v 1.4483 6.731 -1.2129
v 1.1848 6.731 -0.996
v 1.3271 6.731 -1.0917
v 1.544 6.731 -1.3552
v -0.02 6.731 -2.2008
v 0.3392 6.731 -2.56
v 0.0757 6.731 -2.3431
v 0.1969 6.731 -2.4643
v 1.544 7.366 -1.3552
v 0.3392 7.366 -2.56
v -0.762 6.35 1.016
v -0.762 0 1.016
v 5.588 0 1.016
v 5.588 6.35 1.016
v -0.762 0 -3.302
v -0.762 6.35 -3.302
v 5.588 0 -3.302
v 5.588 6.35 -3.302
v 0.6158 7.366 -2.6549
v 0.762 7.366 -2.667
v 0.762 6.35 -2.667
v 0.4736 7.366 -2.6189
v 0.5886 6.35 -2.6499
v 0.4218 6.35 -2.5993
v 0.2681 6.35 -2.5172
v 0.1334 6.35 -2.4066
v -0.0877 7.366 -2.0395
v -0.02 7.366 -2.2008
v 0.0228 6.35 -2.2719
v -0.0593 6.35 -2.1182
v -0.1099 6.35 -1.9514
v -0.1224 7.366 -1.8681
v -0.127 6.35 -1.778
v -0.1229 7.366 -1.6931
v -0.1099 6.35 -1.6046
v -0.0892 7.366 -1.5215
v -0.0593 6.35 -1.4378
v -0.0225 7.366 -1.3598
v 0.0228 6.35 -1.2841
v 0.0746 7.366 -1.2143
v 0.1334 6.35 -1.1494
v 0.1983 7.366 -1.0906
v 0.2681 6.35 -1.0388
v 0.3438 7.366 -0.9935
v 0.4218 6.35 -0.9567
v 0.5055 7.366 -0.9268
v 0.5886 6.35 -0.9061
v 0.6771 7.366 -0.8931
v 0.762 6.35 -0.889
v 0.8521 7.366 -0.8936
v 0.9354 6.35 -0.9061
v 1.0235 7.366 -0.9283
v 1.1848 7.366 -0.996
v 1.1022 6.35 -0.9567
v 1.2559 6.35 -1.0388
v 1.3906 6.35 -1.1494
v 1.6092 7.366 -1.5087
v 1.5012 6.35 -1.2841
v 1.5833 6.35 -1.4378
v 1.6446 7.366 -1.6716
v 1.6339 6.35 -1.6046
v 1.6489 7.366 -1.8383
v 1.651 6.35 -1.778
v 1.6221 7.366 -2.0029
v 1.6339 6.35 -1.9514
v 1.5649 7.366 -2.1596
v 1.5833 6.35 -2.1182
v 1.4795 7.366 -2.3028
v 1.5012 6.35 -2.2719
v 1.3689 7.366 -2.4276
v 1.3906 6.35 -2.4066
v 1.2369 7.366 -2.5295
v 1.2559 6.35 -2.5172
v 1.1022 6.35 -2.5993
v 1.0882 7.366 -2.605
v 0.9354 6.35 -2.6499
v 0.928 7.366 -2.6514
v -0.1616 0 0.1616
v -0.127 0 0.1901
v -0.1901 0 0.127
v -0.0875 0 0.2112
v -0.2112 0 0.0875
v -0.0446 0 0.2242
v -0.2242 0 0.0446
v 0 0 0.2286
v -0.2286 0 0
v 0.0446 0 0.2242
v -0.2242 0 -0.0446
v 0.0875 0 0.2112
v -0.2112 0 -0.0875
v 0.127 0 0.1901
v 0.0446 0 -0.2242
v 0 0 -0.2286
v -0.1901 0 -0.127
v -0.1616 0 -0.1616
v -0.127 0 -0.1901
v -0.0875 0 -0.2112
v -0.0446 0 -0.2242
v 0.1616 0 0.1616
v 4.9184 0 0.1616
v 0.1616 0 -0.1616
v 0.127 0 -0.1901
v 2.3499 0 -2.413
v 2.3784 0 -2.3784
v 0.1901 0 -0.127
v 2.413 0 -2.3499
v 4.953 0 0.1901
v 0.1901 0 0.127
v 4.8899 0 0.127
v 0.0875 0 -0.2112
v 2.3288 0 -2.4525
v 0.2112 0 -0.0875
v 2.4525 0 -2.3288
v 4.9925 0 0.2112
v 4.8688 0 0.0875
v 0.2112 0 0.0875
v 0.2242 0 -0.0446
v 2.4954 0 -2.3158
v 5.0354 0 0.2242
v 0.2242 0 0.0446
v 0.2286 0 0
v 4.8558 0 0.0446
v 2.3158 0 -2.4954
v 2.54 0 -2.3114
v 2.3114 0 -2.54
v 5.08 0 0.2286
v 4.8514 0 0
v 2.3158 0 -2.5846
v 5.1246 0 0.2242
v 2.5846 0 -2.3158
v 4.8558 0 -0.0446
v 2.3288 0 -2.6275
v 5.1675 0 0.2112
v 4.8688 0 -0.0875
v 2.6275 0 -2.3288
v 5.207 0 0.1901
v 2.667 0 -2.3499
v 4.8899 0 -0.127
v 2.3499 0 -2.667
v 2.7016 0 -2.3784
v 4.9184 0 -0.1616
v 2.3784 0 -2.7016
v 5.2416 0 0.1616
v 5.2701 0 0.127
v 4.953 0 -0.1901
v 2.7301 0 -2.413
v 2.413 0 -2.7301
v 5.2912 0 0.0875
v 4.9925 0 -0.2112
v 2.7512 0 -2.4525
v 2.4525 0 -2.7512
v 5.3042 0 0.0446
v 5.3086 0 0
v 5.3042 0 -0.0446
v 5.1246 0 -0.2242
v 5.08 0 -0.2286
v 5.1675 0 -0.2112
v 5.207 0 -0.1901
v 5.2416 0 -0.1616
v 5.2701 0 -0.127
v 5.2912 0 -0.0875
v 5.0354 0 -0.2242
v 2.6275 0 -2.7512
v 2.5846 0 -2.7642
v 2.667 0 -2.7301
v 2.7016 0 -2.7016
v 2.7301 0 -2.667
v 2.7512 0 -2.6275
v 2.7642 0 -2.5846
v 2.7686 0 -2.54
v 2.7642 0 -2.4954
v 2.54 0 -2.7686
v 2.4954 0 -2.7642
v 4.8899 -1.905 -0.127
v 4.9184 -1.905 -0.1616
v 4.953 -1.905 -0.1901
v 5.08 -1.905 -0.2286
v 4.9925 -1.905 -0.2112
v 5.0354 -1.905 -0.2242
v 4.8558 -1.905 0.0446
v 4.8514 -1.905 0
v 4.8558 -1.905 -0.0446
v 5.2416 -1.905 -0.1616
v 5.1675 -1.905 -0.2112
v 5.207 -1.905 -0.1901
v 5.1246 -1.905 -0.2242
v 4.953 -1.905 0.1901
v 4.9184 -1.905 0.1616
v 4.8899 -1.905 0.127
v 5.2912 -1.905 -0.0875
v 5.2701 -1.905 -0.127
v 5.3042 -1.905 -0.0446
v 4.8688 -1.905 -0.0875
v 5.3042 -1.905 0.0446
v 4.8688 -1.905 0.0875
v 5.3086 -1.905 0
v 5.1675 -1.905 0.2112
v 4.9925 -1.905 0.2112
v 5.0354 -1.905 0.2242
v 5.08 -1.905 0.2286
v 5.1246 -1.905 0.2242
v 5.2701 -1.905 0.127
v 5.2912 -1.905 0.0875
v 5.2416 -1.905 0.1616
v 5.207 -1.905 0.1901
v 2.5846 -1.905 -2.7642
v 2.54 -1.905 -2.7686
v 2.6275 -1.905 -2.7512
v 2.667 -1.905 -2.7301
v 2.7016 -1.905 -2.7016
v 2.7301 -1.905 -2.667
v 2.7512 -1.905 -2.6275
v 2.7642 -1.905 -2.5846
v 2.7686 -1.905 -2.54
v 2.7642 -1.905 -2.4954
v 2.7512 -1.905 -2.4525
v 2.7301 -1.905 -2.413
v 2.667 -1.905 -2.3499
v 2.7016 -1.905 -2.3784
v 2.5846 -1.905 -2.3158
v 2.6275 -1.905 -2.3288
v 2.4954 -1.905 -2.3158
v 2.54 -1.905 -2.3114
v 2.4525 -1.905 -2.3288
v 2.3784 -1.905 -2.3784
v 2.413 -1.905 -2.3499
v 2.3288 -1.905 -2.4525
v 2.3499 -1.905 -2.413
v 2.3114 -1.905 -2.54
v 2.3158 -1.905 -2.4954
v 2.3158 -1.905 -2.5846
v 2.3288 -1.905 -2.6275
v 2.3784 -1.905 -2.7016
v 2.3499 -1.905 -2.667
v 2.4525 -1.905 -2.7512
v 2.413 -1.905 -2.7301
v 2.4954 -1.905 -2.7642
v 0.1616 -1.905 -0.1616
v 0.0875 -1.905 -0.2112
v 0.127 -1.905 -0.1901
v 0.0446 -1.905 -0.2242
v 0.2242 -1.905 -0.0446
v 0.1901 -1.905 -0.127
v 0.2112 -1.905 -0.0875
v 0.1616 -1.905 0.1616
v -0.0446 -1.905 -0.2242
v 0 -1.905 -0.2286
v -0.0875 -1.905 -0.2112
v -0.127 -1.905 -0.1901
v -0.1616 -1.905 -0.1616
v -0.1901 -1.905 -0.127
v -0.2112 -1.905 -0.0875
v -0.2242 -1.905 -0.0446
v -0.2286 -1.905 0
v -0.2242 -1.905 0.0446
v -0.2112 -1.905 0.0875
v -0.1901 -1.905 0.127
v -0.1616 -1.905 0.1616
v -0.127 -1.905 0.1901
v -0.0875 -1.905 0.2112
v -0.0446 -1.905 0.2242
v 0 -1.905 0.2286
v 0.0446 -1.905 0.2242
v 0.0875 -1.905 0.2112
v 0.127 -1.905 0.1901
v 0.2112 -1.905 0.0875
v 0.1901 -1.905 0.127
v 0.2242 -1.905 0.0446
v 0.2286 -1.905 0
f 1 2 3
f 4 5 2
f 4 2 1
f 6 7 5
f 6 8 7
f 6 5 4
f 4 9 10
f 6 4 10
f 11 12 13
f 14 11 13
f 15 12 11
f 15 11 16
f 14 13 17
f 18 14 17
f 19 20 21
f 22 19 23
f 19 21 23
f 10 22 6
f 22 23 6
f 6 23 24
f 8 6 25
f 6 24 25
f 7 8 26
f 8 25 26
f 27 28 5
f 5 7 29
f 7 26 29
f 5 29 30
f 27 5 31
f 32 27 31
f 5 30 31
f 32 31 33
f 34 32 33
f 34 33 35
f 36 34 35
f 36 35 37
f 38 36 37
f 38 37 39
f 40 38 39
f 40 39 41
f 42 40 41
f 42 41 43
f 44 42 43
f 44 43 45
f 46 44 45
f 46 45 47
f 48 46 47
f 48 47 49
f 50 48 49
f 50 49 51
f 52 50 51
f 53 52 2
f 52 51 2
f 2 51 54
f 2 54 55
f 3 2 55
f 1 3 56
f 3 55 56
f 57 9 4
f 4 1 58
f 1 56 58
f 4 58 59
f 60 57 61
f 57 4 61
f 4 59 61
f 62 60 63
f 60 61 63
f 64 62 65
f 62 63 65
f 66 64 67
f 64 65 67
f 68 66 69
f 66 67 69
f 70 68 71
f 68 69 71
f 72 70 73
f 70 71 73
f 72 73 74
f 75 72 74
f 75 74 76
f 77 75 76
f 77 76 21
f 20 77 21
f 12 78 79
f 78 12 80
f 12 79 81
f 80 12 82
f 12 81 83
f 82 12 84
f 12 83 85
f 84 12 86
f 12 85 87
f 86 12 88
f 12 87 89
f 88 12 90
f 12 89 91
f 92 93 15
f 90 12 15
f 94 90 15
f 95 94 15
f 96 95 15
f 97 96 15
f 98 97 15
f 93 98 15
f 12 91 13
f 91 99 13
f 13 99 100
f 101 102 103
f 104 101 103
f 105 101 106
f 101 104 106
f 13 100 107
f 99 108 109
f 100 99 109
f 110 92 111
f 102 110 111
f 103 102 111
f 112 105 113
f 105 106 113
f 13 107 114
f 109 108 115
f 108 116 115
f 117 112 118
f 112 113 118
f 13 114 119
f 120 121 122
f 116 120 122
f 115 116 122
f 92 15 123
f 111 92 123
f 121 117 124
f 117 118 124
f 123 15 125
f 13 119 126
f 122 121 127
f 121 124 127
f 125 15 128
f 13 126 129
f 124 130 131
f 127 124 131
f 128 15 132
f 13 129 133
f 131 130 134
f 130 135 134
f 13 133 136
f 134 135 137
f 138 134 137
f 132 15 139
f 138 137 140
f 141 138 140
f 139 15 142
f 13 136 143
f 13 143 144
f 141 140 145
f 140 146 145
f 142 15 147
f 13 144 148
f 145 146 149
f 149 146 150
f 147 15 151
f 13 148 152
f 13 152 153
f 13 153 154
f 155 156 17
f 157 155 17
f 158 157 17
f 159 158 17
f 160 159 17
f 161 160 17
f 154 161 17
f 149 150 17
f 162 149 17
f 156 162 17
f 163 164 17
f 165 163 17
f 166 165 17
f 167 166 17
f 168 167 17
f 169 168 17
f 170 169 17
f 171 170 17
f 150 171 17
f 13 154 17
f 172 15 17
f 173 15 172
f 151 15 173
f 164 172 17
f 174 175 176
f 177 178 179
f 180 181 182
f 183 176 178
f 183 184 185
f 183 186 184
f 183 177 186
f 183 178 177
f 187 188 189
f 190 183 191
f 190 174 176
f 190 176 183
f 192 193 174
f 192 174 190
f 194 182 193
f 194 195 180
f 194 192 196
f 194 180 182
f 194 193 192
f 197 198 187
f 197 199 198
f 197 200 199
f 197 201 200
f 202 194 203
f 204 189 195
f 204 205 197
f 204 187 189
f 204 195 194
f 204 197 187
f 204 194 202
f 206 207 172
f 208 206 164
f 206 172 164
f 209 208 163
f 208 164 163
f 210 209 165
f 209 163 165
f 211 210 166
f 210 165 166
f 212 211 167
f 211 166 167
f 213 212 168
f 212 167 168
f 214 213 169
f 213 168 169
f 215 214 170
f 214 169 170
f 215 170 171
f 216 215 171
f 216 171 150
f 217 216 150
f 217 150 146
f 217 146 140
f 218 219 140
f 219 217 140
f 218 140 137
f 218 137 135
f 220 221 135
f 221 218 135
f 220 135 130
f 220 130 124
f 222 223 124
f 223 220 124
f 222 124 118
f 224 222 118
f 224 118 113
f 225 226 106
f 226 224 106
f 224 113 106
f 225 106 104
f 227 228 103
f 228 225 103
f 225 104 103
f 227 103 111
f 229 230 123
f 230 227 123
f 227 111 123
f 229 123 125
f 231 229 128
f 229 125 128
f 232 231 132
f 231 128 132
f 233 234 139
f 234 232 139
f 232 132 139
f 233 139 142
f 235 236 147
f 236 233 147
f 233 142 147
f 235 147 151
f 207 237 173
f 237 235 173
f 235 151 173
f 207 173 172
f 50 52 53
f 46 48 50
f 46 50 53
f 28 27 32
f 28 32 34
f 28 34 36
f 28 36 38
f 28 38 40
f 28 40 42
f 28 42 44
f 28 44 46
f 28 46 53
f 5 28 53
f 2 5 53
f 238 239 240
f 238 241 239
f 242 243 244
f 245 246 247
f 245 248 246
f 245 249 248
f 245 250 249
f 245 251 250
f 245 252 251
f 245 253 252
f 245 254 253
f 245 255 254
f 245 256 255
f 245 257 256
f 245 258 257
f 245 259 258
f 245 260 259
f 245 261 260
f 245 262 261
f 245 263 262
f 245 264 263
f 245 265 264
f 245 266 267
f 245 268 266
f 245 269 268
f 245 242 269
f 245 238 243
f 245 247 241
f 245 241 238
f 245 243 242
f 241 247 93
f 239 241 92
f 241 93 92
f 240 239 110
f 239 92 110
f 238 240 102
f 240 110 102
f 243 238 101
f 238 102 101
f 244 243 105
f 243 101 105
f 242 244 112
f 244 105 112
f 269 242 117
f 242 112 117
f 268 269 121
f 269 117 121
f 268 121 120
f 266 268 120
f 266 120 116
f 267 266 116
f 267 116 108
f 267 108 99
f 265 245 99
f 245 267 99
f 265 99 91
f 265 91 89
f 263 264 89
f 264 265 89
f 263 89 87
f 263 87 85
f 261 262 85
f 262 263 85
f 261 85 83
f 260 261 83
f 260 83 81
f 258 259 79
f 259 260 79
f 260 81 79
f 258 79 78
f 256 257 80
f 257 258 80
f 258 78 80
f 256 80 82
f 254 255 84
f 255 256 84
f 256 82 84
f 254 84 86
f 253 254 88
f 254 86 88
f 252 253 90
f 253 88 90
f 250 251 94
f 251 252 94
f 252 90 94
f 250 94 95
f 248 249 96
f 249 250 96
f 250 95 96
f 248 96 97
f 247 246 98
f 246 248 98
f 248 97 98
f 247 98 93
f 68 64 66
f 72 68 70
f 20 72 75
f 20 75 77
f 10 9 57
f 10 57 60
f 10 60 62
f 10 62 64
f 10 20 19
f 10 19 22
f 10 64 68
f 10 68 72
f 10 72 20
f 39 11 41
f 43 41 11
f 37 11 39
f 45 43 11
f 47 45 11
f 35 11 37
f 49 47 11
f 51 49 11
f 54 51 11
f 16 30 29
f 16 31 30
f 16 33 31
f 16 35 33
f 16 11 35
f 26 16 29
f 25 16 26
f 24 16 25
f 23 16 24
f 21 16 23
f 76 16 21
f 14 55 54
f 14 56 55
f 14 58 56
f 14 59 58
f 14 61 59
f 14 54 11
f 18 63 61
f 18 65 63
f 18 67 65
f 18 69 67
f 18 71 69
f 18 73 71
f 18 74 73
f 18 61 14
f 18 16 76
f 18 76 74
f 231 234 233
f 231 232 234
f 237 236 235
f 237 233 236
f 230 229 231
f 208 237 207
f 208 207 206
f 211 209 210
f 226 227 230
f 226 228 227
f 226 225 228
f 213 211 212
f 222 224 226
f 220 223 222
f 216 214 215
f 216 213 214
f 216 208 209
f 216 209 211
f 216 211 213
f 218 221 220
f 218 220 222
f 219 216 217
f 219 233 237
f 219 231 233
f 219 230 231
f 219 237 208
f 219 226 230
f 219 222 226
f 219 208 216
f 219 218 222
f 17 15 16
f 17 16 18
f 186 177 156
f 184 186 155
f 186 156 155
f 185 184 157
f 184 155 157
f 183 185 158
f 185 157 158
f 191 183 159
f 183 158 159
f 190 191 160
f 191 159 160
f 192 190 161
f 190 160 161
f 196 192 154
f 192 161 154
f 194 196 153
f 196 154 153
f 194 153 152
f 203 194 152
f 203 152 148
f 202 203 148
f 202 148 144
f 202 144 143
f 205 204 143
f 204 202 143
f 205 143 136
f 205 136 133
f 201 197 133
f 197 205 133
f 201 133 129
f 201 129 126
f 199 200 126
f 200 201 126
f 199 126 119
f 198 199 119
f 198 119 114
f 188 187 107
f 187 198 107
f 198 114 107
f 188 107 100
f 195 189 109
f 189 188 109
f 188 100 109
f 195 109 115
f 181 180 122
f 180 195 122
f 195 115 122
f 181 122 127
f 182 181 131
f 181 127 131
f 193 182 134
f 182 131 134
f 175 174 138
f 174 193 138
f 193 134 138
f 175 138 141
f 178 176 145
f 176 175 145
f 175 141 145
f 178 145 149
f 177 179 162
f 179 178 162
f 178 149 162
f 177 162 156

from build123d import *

# Parameters (mm, degrees)
SKETCH1_W      = 6.35
SKETCH1_H      = 4.318
EXTRUDE1_DEPTH = 6.35
SKETCH2_R      = 0.889
EXTRUDE2_DEPTH = 1.016
EXTRUDE3_DEPTH = 0.635
SKETCH4_R      = 0.2286
EXTRUDE4_DEPTH = 4.7752
SKETCH5_W      = 5.5372
SKETCH5_H      = 2.8702
PCB_TRIM_DEPTH = 11.204353189


with BuildPart() as part:
    # Sketch1 → Extrude1 (new body)
    with BuildSketch(Plane(origin=(0, 0, 0), x_dir=(1, 0, 0), z_dir=(0, 1, 0))):
        with Locations((2.413, 1.143)):
            Rectangle(SKETCH1_W, SKETCH1_H)
    extrude(amount=EXTRUDE1_DEPTH)

    # Sketch2 → Extrude2 (add)
    with BuildSketch(Plane(origin=(0, 6.35, 0), x_dir=(1, 0, 0), z_dir=(0, 1, 0))):
        with Locations(Location((0.762, 1.778, 0), (0, 0, 90))):
            Circle(SKETCH2_R)
    extrude(amount=EXTRUDE2_DEPTH)

    # Sketch3 → Extrude3 (cut)
    with BuildSketch(Plane(origin=(0, 7.366, 0), x_dir=(1, 0, 0), z_dir=(0, 1, 0))):
        Polygon((-0.145336371, 2.326126126), (1.310126126, 0.870663629), (1.669336371, 1.229873874), (0.213873874, 2.685336371), align=None)
    extrude(amount=-EXTRUDE3_DEPTH, mode=Mode.SUBTRACT)

    # Sketch4 → Extrude4 (add)
    with BuildSketch(Plane.XZ):
        with Locations(Location((0, 0, 0), (0, 0, 270))):
            Circle(SKETCH4_R)
        with Locations(Location((5.08, 0, 0), (0, 0, 270))):
            Circle(SKETCH4_R)
        with Locations(Location((2.54, -2.54, 0), (0, 0, 270))):
            Circle(SKETCH4_R)
    extrude(amount=EXTRUDE4_DEPTH)

    # Sketch5 → PCB Trim (cut, through all)
    with BuildSketch(Plane.XY.offset(1.016)):
        with Locations((2.54, -3.3401)):
            Rectangle(SKETCH5_W, SKETCH5_H)
    extrude(amount=-PCB_TRIM_DEPTH, mode=Mode.SUBTRACT)


solid = part.part
